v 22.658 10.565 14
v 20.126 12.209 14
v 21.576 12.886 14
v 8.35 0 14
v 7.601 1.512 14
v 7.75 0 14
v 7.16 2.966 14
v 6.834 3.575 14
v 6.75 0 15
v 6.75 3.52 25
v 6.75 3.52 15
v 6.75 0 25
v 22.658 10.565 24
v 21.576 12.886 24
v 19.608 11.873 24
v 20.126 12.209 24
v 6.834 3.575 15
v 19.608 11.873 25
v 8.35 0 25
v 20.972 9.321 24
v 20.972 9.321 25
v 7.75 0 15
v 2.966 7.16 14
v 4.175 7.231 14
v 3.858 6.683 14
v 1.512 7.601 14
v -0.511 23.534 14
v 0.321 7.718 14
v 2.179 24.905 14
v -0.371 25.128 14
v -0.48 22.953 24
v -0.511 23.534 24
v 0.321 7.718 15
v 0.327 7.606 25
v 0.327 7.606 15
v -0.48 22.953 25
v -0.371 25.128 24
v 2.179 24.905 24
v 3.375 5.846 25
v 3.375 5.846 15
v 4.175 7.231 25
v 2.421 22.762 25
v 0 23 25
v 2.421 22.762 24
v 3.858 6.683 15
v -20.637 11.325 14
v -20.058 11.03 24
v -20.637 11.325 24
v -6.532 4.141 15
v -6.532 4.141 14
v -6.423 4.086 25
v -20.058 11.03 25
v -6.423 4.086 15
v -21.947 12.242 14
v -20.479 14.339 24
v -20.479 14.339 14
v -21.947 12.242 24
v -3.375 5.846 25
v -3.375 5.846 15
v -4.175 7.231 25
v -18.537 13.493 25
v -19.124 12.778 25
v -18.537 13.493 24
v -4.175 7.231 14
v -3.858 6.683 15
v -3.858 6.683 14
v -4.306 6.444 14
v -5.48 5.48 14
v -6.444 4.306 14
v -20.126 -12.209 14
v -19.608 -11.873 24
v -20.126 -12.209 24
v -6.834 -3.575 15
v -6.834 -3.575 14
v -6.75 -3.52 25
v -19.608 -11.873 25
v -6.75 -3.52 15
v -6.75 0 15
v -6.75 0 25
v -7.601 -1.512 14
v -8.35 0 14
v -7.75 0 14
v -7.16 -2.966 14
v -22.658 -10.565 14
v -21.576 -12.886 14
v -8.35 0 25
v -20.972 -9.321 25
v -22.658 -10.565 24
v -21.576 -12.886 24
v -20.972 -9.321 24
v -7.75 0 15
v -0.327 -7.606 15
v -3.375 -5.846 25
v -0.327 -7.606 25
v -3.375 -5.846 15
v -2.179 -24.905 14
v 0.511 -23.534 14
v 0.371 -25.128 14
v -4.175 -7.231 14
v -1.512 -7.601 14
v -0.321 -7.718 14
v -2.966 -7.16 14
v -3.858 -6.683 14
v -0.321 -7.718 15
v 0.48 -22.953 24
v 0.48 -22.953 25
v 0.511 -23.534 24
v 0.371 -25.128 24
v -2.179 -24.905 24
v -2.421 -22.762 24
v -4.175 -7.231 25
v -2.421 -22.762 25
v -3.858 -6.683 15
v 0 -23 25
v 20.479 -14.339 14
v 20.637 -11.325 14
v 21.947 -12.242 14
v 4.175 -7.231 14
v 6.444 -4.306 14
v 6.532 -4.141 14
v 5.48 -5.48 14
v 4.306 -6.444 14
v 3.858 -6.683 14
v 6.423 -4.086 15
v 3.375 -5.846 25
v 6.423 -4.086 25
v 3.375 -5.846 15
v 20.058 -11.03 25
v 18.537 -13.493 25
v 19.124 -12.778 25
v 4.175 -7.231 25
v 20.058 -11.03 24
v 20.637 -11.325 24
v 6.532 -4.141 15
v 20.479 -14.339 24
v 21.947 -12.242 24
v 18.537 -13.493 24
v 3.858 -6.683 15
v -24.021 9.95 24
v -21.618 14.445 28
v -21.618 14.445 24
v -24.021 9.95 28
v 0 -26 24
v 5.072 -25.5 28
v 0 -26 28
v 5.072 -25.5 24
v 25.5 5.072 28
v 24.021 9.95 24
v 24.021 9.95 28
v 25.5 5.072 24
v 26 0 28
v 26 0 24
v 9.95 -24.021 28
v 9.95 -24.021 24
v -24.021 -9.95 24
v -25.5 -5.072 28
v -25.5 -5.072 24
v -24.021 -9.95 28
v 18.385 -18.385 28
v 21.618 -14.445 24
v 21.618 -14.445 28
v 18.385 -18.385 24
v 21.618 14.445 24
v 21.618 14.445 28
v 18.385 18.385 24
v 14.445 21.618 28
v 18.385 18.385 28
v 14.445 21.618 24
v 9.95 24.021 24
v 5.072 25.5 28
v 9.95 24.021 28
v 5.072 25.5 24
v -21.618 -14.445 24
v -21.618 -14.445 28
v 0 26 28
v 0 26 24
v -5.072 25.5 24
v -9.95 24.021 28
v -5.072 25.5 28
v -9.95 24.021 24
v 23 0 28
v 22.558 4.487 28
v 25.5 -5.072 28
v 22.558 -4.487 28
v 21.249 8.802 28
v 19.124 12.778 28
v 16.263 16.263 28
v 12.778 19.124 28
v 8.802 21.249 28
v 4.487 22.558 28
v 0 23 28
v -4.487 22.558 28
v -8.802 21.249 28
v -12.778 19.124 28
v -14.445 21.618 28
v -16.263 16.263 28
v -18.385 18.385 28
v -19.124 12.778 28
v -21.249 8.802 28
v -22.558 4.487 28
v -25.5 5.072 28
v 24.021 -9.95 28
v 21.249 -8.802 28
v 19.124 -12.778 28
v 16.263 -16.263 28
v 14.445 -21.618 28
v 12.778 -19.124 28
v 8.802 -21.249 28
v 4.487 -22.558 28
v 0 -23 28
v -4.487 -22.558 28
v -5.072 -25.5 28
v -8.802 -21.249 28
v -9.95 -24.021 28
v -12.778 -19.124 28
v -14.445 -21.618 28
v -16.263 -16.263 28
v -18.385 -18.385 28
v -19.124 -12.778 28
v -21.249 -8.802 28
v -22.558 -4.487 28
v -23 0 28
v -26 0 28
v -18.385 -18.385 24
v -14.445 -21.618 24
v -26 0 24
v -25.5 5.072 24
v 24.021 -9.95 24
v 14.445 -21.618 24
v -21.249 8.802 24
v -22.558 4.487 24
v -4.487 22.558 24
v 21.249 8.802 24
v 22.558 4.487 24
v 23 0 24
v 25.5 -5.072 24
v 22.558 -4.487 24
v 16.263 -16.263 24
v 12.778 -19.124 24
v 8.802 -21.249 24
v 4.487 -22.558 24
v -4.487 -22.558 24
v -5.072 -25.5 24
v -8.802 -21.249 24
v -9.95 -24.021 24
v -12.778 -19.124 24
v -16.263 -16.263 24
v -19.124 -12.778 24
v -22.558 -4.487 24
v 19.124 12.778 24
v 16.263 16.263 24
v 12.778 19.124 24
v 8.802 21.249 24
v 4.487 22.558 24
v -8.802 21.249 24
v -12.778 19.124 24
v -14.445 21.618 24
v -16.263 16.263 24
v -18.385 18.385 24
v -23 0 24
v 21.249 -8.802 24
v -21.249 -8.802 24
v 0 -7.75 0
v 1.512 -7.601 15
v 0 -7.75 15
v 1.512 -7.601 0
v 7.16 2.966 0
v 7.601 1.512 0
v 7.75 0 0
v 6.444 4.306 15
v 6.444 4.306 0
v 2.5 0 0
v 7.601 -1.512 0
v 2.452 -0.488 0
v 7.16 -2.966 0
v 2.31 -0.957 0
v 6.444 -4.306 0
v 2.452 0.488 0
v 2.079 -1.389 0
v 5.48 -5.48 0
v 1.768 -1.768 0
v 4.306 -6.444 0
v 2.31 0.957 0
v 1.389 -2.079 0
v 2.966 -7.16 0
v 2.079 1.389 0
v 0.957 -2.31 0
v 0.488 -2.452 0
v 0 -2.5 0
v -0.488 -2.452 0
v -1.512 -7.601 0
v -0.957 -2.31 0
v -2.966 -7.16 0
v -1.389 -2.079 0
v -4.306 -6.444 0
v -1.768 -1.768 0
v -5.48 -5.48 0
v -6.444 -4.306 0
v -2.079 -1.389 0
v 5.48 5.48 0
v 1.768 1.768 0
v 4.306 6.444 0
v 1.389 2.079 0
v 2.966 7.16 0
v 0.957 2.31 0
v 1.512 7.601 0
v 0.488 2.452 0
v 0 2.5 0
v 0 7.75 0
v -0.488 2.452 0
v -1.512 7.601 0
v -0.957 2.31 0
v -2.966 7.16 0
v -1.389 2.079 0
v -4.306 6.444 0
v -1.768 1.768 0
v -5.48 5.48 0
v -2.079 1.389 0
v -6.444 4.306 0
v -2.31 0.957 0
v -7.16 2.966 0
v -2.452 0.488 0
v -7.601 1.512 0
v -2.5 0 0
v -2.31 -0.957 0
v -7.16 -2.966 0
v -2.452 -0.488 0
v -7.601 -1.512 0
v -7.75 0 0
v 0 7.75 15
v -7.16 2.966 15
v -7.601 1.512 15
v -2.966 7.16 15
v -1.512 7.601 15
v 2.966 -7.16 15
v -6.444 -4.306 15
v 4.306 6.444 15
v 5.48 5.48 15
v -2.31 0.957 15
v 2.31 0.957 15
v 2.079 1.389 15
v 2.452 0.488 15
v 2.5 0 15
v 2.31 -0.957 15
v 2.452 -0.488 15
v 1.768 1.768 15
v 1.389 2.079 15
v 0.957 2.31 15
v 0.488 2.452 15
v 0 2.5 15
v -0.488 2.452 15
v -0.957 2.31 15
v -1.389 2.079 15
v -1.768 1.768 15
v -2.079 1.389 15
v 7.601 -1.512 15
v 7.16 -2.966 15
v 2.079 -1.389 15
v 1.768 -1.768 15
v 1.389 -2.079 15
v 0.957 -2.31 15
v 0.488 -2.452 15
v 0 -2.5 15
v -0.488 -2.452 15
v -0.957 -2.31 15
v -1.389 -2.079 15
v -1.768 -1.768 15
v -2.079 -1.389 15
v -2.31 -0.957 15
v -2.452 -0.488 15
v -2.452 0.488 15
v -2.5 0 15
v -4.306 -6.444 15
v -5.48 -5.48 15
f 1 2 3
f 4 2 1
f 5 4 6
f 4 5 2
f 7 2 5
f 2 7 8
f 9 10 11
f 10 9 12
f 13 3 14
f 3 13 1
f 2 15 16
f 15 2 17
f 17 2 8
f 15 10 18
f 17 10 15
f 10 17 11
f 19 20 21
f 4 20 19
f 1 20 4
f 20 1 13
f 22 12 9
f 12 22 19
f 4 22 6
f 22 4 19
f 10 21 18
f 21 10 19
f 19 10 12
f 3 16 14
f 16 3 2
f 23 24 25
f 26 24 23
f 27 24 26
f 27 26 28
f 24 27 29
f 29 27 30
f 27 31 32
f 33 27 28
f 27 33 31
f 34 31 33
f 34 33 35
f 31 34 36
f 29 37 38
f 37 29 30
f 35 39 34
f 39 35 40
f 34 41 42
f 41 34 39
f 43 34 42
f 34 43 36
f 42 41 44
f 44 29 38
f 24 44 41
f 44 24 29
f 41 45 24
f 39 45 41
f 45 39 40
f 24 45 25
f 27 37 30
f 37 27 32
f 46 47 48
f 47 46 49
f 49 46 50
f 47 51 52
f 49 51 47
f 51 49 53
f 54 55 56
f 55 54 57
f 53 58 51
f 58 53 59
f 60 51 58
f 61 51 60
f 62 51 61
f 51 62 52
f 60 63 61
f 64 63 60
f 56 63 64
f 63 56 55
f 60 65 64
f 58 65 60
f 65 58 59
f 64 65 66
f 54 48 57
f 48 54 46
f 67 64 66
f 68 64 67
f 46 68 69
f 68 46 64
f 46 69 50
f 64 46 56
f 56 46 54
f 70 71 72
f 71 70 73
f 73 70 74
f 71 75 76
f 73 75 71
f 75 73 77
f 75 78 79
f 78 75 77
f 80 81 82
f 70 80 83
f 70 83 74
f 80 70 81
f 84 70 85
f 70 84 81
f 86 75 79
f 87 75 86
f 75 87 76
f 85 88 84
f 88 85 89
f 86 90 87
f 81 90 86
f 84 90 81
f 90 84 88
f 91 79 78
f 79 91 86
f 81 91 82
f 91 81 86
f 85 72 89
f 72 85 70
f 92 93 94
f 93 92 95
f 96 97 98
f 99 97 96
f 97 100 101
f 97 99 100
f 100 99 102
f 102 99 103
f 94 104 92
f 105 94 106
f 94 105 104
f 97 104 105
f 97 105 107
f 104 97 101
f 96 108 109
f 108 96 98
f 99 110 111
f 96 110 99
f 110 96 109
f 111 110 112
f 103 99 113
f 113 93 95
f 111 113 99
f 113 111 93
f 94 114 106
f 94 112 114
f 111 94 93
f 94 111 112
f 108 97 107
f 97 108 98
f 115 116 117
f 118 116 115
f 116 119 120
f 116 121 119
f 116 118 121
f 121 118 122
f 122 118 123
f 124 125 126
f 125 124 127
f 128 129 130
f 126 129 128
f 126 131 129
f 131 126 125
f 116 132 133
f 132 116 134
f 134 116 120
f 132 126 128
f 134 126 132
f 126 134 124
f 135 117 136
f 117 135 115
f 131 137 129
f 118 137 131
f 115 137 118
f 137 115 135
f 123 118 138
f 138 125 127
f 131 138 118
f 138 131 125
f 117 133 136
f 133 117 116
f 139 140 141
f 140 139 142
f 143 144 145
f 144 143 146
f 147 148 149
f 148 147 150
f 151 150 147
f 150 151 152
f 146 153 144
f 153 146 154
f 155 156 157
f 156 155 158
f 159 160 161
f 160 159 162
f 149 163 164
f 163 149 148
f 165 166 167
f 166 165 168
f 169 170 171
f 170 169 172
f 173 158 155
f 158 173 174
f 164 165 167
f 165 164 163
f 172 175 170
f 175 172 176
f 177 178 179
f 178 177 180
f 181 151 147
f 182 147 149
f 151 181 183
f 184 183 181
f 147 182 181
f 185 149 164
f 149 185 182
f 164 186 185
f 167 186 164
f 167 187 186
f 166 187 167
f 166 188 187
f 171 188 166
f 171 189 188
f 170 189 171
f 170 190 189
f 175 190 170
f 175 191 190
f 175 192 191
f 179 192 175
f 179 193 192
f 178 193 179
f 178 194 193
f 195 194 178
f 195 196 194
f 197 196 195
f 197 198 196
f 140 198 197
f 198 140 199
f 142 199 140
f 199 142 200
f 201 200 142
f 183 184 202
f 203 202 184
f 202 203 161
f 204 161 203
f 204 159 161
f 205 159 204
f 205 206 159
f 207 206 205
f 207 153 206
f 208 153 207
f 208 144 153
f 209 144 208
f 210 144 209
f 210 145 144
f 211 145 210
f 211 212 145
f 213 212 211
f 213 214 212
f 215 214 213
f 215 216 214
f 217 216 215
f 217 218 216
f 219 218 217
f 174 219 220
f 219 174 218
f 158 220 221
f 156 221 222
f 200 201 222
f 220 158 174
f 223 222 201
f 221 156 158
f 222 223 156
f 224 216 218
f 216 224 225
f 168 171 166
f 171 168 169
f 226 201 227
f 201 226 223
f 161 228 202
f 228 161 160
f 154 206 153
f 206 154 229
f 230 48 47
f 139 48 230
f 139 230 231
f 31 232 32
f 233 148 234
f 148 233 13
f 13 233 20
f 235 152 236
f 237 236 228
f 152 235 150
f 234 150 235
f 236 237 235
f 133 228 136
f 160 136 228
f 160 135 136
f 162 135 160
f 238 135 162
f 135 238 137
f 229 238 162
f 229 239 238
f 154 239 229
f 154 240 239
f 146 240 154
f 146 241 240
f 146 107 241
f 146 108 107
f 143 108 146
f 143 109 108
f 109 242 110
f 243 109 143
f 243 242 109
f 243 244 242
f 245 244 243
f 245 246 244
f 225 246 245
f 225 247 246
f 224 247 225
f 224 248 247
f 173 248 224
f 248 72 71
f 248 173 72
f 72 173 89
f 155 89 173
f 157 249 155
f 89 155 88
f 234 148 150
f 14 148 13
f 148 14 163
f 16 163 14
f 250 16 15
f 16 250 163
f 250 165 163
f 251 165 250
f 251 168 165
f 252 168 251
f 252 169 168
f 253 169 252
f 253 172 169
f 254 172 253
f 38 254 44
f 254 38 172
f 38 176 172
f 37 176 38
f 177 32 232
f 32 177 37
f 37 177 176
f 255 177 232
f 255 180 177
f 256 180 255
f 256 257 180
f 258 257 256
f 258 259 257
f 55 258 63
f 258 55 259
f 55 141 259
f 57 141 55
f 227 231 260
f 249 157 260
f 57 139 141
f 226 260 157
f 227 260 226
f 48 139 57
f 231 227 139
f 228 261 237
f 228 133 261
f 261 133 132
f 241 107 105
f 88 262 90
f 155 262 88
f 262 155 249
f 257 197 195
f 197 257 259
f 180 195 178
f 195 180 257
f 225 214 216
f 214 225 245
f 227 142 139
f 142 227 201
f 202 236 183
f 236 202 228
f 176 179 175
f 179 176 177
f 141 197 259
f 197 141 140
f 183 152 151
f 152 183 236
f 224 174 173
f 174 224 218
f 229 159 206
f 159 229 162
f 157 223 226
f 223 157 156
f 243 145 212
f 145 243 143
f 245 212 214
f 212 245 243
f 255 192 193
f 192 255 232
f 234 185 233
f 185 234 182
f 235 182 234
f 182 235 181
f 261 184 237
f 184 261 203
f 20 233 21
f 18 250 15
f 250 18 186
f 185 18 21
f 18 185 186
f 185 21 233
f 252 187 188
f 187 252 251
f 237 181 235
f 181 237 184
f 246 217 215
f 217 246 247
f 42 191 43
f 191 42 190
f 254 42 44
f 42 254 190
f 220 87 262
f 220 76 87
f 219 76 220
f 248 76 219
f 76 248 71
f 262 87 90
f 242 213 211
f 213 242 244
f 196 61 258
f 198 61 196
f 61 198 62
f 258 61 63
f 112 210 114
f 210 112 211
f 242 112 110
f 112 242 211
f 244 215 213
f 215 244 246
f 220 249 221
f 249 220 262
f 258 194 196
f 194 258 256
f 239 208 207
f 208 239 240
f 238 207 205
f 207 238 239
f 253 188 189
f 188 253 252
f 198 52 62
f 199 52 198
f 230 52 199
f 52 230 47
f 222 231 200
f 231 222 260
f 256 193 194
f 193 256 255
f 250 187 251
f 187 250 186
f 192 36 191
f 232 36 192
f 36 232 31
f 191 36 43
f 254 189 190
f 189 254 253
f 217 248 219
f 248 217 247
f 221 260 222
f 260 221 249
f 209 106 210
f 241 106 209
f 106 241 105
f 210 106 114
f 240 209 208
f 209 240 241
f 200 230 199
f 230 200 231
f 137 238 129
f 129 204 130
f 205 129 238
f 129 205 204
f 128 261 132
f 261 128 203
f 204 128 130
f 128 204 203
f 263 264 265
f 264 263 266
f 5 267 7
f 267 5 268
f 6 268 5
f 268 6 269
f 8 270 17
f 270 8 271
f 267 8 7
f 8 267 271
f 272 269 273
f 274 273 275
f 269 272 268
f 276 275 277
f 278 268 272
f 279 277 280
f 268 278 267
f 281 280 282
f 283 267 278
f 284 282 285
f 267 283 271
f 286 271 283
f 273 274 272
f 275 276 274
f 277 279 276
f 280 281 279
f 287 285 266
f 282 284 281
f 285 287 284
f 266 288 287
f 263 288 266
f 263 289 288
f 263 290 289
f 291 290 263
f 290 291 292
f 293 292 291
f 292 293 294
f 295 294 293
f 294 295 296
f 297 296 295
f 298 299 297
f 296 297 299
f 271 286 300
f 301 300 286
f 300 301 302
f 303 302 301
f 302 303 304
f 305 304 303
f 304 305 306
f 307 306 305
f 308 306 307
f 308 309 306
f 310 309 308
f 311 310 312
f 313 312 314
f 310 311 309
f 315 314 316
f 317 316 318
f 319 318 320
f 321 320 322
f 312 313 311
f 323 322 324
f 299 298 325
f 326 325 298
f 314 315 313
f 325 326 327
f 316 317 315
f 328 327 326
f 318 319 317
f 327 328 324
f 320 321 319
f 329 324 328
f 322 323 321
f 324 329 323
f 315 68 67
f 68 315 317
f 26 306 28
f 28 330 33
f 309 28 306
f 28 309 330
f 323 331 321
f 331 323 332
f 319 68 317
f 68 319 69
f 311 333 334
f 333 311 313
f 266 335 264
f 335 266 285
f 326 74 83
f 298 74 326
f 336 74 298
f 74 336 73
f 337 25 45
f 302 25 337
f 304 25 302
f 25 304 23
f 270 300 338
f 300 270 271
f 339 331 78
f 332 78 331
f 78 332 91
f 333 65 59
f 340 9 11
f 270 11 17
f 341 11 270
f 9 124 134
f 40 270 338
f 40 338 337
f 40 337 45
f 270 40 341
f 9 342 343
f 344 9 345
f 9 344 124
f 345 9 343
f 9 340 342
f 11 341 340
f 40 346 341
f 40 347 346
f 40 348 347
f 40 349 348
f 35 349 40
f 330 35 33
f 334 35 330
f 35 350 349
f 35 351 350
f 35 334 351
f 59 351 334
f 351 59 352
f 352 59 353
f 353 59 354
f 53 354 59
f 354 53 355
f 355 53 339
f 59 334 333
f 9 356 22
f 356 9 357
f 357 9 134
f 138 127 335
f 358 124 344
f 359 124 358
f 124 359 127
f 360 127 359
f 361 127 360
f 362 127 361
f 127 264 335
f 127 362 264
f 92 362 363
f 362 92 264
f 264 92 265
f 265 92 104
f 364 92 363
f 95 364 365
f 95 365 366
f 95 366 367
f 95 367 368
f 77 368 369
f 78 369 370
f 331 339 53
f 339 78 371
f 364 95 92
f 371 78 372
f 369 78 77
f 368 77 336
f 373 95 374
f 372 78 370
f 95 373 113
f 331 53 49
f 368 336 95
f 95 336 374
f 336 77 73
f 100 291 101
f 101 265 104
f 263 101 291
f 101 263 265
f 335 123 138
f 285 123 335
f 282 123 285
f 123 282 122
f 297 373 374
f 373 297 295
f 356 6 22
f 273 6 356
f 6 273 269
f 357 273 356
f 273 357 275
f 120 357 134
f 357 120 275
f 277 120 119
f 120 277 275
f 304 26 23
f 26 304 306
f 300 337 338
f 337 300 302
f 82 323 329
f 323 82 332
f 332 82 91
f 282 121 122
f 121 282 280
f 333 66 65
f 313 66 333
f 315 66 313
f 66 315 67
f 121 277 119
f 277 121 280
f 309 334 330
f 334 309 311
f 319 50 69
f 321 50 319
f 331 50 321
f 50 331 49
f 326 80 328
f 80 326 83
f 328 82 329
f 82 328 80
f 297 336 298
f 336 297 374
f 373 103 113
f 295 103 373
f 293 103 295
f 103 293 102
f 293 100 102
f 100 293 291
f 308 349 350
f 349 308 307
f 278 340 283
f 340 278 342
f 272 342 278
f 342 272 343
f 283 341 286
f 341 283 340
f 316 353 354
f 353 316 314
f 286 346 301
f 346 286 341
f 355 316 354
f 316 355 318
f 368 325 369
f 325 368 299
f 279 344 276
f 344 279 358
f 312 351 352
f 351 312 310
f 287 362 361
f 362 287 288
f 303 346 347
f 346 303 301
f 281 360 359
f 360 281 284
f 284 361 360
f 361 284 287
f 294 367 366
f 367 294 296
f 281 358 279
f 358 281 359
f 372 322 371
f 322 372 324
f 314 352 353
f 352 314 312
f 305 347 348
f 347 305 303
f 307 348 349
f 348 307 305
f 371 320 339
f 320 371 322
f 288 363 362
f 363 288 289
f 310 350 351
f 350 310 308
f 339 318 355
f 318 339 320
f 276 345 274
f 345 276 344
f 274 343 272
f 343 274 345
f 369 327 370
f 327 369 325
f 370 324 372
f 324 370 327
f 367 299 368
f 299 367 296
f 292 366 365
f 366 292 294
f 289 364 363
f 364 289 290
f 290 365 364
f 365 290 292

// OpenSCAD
$fn = 32;

// ----------------------------------------------------------------------
// Impeller: 50 mm, 6 blades, 28 mm tall
// ----------------------------------------------------------------------

// --- parameters (mm) ---
hub_d = 15.5;             // hub diameter
hub_h = 15;               // hub height
imp_d = 50;               // outer diameter over the blades
blades = 6;               // number of blades
blade_t = 1.6;            // blade thickness
blade_h = 10;             // blade height
blade_in_r = 6.75;        // blade root radius
blade_out_r = 23.4;       // blade tip radius
sweep = 25;               // blade sweep, degrees
bore_d = 5;               // shaft bore
shroud_h = 3;             // shroud ring thickness
shroud_d = 52;            // shroud outside diameter

module hub() {
  cylinder(h = hub_h, d = hub_d);
}

module blade() {
  /* blade swept between two boxes: hull of the root and the tip section */
  hull() {
    translate([blade_in_r, 0, hub_h - 1])
      cube([blade_t, blade_t * 2.2, blade_h + 1], center = false);
    rotate([0, 0, sweep])
      translate([blade_out_r, 0, hub_h - 1])
        cube([blade_t, blade_t * 1.6, blade_h + 1], center = false);
  }
}

module blades() {
  for (i = [0 : blades - 1])
    rotate([0, 0, i * 360 / blades]) blade();
}

module shroud() {
  translate([0, 0, hub_h + blade_h - 1])
    difference() {
      cylinder(h = shroud_h + 1, d = shroud_d);
      translate([0, 0, -1]) cylinder(h = shroud_h + 3, d = shroud_d - 2 * 3);
    }
}

difference() {
  union() {
    hub();
    blades();
    shroud();
  }
  translate([0, 0, -1]) cylinder(h = hub_h + blade_h + shroud_h + 3, d = bore_d);
}
